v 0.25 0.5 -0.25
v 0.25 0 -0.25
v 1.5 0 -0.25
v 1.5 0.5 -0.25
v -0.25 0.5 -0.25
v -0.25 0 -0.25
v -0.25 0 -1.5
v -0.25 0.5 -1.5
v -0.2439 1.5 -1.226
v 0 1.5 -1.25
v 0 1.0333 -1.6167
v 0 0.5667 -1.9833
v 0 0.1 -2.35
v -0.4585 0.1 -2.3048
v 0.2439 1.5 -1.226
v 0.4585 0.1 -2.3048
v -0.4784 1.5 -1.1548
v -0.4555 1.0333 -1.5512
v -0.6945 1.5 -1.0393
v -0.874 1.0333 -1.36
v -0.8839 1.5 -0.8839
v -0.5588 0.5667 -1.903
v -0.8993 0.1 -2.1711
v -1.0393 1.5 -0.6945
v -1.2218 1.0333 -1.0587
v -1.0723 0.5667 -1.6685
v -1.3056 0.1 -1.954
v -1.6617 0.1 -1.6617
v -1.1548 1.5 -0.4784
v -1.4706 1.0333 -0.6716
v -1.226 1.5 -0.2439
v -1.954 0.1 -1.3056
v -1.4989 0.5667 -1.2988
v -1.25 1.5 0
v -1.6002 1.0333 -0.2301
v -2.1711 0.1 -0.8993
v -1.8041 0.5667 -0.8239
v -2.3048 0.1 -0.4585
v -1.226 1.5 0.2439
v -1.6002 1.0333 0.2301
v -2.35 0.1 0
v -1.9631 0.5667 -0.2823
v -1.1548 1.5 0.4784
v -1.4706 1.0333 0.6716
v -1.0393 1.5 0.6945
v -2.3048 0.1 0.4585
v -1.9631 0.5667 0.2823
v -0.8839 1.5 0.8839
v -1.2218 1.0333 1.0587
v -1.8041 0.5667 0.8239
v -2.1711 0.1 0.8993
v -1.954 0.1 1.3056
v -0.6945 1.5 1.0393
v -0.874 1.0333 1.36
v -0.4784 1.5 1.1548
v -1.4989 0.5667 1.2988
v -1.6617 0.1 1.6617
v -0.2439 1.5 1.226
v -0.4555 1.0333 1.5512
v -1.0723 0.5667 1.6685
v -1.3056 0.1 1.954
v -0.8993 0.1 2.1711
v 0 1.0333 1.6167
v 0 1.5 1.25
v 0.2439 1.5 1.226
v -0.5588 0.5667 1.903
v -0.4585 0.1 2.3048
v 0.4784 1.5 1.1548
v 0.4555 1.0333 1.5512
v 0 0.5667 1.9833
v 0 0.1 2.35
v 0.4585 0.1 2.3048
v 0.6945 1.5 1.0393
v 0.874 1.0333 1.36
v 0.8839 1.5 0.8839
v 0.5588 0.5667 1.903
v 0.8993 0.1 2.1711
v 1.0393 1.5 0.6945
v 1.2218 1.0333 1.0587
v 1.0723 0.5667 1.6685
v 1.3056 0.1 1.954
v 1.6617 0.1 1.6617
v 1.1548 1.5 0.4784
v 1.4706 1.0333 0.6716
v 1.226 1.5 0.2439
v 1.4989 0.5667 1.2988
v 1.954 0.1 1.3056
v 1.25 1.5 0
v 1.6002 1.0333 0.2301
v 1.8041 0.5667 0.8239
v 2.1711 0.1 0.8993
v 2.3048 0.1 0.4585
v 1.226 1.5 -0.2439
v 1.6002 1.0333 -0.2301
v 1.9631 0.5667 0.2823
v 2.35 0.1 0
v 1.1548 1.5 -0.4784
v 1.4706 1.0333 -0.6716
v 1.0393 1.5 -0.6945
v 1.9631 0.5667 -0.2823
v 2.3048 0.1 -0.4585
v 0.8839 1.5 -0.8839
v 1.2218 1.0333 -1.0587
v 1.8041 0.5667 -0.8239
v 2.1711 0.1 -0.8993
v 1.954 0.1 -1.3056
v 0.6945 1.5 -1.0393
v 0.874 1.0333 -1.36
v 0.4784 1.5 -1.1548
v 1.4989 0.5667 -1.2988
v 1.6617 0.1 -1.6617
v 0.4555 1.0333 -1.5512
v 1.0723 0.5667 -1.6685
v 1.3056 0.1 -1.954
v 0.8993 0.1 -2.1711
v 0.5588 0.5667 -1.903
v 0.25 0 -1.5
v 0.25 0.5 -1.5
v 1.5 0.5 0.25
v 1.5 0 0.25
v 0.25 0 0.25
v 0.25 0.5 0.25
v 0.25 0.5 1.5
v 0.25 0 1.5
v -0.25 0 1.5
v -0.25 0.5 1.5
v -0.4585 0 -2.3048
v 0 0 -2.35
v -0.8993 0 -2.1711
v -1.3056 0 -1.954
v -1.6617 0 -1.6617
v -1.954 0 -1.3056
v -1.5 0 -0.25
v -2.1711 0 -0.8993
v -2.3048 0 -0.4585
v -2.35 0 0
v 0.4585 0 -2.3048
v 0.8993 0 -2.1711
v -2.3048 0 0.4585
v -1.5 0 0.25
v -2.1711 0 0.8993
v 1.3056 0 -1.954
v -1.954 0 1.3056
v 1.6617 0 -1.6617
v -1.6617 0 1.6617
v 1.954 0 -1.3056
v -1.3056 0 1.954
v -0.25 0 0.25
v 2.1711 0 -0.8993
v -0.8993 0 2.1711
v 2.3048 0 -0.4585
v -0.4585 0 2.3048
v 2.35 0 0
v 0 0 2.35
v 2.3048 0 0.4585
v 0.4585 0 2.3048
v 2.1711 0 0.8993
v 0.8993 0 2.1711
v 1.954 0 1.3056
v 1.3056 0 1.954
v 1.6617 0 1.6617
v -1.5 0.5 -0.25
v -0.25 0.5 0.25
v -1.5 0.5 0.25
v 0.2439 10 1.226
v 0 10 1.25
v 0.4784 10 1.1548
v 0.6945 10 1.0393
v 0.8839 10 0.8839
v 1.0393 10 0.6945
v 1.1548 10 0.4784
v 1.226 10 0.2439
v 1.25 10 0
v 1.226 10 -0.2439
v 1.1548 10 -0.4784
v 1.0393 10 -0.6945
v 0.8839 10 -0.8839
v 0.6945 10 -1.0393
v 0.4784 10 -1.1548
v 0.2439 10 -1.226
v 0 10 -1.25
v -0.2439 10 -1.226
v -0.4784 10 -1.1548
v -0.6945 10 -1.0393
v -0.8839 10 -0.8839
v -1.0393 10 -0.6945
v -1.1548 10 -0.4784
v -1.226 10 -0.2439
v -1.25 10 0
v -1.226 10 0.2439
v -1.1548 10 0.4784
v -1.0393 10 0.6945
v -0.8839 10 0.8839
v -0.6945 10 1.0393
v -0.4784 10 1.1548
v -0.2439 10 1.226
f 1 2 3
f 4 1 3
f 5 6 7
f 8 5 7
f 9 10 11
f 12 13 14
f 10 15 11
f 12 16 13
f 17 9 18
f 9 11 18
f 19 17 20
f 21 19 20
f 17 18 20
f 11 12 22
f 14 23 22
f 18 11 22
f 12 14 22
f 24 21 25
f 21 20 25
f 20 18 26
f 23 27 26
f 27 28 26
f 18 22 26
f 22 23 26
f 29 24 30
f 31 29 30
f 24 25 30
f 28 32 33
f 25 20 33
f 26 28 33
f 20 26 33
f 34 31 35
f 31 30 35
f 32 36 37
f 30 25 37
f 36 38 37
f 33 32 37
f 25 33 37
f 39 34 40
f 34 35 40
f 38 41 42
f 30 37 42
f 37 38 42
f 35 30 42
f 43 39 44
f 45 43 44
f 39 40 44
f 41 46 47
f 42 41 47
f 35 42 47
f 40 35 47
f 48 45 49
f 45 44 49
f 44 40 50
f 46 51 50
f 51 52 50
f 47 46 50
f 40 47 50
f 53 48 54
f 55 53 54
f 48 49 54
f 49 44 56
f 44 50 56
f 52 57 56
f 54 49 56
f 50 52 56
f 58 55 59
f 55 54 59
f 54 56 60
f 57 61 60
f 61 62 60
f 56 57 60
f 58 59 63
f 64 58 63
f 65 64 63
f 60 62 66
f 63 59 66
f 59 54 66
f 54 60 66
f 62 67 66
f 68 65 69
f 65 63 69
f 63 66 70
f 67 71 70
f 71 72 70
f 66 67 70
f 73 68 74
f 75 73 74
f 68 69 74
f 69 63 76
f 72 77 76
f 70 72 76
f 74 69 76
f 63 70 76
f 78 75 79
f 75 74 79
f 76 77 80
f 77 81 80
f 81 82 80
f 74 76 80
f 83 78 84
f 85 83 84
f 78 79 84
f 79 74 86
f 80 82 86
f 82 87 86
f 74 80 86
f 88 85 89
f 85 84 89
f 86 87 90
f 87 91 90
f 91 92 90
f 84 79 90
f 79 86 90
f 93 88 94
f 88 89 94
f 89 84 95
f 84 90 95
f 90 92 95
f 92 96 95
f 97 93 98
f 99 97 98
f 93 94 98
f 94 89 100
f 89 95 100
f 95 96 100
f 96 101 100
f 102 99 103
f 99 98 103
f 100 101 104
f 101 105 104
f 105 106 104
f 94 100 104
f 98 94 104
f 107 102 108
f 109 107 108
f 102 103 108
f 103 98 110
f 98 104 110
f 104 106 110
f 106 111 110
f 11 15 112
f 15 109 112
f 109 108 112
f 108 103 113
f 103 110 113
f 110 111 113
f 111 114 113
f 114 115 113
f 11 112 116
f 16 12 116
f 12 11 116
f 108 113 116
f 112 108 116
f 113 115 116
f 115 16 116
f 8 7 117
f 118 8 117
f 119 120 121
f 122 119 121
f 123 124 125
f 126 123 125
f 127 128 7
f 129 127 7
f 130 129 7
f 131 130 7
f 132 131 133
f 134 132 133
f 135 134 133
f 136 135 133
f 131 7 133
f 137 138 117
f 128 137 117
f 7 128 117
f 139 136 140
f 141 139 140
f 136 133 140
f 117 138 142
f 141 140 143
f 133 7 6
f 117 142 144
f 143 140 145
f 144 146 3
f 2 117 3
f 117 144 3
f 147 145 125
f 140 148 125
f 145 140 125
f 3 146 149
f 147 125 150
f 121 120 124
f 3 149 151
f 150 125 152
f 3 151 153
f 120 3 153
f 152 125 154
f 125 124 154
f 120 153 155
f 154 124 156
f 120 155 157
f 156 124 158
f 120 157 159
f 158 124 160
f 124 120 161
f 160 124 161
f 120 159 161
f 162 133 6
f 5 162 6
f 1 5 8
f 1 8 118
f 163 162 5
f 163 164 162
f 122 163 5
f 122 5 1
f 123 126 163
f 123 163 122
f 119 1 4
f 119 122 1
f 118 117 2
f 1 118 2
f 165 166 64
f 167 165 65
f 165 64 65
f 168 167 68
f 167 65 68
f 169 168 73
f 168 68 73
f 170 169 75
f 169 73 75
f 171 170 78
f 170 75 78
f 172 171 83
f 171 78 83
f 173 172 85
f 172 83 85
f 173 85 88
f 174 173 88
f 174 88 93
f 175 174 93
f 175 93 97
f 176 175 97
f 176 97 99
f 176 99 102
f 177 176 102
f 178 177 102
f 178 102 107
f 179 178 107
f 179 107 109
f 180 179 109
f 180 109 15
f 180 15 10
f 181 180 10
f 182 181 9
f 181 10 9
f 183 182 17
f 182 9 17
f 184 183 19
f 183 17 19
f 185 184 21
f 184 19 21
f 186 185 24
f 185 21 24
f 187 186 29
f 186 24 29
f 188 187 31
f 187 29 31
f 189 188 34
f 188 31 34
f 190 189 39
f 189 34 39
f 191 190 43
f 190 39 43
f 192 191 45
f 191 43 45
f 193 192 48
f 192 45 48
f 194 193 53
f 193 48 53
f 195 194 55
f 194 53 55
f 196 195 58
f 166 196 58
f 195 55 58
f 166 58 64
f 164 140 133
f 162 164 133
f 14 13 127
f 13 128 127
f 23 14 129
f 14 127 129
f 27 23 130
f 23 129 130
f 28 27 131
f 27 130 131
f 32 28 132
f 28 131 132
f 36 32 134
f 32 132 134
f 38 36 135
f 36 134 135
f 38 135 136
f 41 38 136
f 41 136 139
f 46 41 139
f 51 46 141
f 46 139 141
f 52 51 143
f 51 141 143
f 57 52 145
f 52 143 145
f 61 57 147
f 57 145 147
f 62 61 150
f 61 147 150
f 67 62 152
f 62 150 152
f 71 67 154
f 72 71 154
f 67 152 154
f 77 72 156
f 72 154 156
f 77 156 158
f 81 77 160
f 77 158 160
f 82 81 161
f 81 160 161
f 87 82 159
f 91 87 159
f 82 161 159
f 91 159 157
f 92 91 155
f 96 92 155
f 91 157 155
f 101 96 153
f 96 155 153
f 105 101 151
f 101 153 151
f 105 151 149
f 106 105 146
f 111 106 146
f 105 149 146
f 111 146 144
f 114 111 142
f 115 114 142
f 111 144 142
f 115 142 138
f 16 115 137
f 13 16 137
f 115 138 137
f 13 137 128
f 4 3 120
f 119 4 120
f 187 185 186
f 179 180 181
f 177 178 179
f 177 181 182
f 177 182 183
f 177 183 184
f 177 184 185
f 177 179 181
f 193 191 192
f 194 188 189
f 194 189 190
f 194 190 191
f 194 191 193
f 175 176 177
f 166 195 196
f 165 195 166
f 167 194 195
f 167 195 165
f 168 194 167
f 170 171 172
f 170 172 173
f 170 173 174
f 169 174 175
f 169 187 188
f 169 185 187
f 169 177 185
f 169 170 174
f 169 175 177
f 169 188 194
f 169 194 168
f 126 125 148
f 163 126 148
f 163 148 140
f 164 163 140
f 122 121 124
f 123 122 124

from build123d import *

# Parameters (mm, degrees)
SKETCH1_R           = 1.25
BOSS_EXTRUDE1_DEPTH = 10
CUT_EXTRUDE1_DEPTH  = 0.5


with BuildPart() as part:
    # Sketch1 → Boss-Extrude1 (new body)
    with BuildSketch(Plane(origin=(0, 0, 0), x_dir=(1, 0, 0), z_dir=(0, 1, 0))):
        with Locations(Location((0, 0, 0), (0, 0, 270))):
            Circle(SKETCH1_R)
    extrude(amount=BOSS_EXTRUDE1_DEPTH)

    # Sketch2 → Revolve1 (revolve)
    with BuildSketch(Plane(origin=(0, 0, 0), x_dir=(0, 0, -1), z_dir=(1, 0, 0)), mode=Mode.PRIVATE) as revolve1_sk:
        Polygon((0, 0), (0, 1.5), (-1.25, 1.5), (-2.35, 0.1), (-2.35, 0), align=None)
    revolve(revolve1_sk.sketch.rotate(Axis((0, -0.5, 0), (0, 1, 0)), 180), axis=Axis((0, -0.5, 0), (0, 1, 0)))

    # Sketch3 → Cut-Extrude1 (cut)
    with BuildSketch(Plane.XZ):
        Polygon((-1.5, -0.25), (-0.25, -0.25), (-0.25, -1.5), (0.25, -1.5), (0.25, -0.25), (1.5, -0.25), (1.5, 0.25), (0.25, 0.25), (0.25, 1.5), (-0.25, 1.5), (-0.25, 0.25), (-1.5, 0.25), align=None)
    extrude(amount=-CUT_EXTRUDE1_DEPTH, mode=Mode.SUBTRACT)


solid = part.part
